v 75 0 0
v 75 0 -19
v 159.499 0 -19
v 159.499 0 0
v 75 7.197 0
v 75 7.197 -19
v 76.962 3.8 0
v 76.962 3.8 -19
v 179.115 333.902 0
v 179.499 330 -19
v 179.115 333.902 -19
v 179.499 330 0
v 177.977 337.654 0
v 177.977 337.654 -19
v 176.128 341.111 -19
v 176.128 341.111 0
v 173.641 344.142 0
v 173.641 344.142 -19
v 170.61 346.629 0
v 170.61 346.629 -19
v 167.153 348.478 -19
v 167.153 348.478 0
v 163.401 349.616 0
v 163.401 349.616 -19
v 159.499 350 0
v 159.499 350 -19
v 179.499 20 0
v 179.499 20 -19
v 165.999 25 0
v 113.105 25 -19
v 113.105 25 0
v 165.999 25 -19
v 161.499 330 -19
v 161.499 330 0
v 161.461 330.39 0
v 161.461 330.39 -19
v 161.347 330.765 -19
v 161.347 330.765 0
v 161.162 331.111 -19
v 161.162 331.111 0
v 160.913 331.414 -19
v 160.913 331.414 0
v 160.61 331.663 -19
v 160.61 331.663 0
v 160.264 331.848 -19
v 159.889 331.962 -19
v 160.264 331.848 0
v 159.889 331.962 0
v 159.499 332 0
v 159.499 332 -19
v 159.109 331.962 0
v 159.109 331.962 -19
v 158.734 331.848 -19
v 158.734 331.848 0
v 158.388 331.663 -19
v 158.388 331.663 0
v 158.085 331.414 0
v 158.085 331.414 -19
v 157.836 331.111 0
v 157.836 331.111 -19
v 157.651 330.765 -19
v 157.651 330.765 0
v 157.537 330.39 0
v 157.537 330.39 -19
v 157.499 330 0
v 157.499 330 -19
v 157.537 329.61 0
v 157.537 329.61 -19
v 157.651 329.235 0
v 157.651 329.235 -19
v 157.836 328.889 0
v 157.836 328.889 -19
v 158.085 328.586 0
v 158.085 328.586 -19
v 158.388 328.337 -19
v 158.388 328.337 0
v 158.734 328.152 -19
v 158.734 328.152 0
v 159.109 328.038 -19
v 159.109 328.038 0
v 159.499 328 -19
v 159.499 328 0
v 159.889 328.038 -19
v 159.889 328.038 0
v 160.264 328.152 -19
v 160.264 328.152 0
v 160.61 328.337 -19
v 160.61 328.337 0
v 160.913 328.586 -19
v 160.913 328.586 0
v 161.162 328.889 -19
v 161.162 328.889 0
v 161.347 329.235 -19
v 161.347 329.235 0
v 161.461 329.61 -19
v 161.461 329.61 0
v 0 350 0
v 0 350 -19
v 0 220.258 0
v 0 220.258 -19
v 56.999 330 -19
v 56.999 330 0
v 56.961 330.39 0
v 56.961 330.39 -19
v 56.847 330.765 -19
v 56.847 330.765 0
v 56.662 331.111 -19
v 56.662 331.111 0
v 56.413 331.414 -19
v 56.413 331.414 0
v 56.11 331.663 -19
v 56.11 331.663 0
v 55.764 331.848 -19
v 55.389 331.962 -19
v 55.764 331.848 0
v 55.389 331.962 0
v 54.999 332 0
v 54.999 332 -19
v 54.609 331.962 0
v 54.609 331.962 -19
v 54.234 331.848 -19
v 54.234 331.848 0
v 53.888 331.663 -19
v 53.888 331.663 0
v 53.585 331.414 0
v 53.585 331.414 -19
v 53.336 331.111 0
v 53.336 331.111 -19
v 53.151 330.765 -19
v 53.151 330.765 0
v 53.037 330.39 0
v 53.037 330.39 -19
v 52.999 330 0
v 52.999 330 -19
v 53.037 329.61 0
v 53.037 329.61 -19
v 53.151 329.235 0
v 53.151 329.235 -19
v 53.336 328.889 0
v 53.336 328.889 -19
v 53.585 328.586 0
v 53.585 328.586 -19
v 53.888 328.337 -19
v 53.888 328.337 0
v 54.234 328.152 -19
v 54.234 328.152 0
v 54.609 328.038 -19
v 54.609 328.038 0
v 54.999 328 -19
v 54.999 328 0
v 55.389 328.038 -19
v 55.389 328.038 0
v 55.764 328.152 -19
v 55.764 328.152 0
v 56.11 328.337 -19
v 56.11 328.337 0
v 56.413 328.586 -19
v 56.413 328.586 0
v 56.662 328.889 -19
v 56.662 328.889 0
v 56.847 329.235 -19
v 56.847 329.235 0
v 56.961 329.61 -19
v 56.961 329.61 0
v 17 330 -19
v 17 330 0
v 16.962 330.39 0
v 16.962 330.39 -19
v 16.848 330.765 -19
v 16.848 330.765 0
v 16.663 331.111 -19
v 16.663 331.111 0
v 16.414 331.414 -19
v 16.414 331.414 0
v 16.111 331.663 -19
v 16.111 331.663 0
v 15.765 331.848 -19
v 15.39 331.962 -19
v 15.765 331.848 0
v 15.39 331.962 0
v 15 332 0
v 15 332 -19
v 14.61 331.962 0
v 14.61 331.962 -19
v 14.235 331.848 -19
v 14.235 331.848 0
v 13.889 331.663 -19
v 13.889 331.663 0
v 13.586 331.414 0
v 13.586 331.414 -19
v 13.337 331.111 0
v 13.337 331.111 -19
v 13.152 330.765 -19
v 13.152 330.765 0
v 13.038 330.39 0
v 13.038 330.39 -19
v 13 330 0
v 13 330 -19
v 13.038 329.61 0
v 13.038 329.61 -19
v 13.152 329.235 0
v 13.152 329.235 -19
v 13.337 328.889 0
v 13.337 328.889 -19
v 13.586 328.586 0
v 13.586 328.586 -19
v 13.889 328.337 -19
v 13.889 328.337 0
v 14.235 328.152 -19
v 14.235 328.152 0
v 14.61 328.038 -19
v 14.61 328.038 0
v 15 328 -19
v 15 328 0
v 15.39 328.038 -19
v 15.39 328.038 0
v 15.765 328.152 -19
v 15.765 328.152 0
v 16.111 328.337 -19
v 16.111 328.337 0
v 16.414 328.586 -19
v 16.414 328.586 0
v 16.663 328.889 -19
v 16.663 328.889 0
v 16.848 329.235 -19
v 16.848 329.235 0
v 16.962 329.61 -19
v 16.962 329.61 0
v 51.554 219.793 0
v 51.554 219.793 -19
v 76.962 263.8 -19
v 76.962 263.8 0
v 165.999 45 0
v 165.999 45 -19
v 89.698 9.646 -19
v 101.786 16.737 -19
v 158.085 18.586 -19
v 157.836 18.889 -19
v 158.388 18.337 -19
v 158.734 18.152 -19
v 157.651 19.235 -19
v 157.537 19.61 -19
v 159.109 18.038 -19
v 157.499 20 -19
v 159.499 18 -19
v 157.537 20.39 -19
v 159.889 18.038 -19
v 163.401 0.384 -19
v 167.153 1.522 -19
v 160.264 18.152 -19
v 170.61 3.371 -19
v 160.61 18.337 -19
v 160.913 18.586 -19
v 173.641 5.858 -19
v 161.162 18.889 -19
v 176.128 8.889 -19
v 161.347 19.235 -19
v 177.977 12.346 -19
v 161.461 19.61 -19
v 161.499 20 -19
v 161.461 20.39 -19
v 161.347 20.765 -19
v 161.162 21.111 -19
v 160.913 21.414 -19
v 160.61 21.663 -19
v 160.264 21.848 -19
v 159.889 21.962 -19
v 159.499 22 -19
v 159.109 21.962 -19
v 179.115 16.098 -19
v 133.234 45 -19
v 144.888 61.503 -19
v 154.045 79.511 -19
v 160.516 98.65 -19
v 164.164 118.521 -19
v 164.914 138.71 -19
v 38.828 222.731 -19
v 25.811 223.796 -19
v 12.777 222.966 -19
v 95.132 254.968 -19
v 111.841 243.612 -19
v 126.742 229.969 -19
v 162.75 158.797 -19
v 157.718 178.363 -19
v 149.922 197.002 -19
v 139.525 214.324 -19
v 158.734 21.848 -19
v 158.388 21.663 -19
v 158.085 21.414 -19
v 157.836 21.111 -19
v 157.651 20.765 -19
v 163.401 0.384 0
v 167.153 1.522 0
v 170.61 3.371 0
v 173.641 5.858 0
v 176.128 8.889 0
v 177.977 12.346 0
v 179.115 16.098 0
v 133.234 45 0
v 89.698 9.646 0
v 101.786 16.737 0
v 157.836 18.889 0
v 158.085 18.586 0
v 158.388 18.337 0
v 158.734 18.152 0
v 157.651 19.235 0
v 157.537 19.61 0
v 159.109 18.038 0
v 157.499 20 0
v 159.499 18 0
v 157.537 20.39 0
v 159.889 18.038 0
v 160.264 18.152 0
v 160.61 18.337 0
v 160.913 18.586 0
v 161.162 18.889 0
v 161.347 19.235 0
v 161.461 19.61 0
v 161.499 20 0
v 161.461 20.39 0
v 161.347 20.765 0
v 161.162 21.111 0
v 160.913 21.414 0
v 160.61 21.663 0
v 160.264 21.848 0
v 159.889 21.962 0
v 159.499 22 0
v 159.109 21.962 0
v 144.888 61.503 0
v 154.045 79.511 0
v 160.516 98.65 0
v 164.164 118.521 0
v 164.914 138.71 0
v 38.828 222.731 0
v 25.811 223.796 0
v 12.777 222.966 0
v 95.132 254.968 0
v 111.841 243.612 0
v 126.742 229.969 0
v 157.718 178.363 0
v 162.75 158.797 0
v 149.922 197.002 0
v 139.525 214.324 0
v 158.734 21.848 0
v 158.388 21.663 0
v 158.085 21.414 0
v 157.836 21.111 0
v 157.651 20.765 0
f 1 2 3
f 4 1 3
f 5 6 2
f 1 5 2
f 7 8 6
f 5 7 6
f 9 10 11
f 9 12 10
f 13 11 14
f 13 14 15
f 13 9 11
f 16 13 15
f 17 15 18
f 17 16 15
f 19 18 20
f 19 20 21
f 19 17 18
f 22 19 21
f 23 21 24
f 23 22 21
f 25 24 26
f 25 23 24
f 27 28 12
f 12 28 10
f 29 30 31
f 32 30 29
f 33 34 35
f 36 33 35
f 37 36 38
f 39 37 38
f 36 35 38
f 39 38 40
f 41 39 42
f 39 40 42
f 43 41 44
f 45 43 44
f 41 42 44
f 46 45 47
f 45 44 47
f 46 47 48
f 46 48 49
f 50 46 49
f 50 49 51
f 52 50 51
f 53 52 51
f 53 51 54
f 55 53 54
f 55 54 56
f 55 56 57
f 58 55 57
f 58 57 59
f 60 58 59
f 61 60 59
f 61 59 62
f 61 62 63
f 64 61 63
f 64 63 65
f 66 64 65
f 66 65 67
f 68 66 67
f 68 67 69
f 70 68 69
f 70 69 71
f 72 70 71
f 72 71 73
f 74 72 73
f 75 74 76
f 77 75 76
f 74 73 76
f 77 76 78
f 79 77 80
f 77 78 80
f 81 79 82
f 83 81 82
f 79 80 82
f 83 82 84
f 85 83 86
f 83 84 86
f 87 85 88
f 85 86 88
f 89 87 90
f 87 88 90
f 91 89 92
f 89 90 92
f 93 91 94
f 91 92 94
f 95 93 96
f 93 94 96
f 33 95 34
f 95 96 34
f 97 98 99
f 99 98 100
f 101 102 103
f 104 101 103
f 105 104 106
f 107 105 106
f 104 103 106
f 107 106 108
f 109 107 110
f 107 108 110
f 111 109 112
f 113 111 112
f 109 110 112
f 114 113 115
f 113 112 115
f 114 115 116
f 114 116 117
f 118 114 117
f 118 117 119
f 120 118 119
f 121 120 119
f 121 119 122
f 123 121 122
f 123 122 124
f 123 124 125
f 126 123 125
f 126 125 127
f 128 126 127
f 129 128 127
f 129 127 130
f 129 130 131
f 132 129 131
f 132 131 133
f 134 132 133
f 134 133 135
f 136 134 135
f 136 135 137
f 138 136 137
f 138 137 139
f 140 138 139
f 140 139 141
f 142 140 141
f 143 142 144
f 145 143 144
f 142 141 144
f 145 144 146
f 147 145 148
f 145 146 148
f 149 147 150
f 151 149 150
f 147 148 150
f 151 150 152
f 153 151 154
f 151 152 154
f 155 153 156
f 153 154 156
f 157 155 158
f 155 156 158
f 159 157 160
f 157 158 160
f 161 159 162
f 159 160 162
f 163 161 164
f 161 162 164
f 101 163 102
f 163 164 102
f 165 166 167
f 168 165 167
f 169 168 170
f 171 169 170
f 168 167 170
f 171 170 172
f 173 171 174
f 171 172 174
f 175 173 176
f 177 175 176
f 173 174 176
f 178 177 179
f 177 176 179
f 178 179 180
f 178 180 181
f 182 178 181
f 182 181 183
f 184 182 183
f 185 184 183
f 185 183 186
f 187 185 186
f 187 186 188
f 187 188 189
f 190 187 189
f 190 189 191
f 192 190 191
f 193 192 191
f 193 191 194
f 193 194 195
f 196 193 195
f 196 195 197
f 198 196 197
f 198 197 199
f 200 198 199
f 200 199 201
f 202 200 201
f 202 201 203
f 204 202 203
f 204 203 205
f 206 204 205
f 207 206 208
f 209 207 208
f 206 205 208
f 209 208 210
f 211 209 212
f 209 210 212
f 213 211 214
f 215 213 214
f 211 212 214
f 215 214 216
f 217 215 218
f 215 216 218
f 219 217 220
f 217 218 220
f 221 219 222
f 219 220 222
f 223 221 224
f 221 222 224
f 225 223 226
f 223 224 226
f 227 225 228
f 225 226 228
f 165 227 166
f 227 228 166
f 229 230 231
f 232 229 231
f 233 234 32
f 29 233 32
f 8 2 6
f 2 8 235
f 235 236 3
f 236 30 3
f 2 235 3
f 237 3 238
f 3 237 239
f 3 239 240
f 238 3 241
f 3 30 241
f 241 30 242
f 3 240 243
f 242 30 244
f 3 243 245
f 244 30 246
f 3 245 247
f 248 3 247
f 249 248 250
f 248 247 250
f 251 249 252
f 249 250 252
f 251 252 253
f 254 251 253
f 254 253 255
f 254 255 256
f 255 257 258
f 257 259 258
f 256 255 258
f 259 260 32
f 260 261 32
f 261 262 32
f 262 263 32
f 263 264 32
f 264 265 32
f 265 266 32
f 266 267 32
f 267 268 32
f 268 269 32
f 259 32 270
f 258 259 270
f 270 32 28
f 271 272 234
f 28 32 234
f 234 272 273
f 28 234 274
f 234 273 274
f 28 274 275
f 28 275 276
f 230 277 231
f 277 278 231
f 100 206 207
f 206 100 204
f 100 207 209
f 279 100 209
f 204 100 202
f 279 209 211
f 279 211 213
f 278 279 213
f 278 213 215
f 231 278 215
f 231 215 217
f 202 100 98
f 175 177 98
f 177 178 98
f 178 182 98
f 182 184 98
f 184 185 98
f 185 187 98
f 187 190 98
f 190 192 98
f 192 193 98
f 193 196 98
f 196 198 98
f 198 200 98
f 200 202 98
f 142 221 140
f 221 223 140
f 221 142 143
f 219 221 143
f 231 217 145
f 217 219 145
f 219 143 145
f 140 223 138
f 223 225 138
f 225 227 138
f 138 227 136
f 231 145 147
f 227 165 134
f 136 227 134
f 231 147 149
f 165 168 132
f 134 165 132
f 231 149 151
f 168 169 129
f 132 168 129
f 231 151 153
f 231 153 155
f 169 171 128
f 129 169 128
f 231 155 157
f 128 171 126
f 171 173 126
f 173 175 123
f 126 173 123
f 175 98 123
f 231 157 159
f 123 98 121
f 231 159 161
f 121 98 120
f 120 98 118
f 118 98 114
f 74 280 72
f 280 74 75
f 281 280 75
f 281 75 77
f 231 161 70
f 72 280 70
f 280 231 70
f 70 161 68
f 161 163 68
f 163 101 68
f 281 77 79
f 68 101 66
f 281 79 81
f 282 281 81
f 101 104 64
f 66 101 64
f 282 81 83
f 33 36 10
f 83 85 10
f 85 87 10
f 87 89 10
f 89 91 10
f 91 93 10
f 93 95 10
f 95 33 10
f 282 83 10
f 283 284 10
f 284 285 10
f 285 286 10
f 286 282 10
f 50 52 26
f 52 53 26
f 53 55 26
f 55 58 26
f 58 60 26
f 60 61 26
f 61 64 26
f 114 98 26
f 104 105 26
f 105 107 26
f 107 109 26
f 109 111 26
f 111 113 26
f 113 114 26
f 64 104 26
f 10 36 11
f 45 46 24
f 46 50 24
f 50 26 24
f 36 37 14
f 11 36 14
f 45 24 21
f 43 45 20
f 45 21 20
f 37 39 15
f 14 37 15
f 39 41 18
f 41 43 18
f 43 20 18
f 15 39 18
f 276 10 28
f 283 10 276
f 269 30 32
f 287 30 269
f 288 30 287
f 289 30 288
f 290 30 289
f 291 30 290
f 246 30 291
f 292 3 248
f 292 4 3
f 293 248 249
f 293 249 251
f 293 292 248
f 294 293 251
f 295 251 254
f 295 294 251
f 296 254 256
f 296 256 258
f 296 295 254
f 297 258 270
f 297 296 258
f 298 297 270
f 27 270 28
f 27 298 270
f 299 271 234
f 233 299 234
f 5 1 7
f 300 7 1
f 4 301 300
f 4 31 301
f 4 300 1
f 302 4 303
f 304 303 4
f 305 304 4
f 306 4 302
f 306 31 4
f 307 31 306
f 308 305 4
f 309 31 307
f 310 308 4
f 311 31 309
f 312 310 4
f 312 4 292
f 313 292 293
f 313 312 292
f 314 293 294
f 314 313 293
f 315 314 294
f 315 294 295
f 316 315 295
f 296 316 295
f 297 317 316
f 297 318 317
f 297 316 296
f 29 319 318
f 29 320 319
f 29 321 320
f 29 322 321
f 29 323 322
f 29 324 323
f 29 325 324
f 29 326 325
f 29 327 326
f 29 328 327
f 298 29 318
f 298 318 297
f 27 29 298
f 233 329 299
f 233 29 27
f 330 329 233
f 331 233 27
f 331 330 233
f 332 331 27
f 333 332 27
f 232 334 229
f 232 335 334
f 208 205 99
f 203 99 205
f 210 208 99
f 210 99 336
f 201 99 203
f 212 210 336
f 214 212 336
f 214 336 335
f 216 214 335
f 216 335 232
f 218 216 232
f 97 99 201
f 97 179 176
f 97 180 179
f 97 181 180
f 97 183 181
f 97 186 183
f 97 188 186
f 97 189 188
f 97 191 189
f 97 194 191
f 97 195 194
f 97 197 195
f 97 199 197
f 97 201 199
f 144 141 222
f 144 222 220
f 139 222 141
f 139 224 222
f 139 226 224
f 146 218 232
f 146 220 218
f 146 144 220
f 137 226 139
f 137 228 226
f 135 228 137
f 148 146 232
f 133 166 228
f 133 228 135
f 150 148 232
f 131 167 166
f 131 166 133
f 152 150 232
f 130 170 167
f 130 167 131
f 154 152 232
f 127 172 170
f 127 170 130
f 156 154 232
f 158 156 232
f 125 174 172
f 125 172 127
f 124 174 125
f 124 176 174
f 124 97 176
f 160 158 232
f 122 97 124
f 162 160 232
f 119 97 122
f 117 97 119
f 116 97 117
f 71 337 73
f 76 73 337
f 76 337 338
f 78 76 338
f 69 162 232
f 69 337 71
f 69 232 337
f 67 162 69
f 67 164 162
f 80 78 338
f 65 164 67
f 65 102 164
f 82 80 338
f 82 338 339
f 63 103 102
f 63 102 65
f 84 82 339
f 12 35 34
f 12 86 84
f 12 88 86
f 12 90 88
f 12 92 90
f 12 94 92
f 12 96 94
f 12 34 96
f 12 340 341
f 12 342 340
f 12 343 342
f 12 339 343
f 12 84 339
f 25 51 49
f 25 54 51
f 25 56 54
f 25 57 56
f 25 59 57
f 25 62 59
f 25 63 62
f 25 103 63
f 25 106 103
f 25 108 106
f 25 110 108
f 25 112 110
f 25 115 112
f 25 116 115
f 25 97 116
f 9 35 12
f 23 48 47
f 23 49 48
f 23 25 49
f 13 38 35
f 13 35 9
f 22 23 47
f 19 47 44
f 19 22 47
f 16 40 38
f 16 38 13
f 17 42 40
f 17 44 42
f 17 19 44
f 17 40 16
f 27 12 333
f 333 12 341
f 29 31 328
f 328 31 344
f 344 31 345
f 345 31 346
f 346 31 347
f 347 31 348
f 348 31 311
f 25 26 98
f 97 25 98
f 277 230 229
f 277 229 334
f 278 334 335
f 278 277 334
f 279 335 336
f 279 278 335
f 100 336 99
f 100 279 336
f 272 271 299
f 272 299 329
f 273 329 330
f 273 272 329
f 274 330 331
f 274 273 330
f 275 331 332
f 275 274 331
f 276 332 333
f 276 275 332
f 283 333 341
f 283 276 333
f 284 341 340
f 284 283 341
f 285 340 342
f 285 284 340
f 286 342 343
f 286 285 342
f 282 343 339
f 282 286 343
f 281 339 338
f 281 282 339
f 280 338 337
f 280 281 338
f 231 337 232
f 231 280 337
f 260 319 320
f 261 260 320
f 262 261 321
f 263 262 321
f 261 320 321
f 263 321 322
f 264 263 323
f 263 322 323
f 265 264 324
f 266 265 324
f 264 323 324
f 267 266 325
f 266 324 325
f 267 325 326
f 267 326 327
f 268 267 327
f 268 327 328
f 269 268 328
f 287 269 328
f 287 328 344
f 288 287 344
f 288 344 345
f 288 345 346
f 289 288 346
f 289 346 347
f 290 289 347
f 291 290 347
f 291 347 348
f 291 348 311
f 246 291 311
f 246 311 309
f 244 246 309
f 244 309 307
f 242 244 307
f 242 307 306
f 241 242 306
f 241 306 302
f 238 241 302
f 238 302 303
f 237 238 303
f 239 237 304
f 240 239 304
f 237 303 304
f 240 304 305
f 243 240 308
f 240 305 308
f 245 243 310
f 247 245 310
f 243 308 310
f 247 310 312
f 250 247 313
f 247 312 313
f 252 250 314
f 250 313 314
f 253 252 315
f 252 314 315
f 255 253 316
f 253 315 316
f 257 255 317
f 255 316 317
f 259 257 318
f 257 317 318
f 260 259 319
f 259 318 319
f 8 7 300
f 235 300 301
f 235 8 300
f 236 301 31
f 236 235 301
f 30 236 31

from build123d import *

# Parameters (mm, degrees)
PAD016_DEPTH    = 19
FILLET006_R     = 20
SKETCH023_R     = 2
POCKET014_DEPTH = 19.001
SKETCH026_R     = 2
POCKET016_DEPTH = 19.001
SKETCH047_W     = 56
SKETCH047_H     = 20
POCKET030_DEPTH = 19.001


with BuildPart() as part:
    # Sketch021 → Pad016 (new body)
    with BuildSketch(Plane.XY):
        with BuildLine():
            Line((200, 216.2), (200, 86.458082))
            ThreePointArc((251.554314, 85.993421), (225.811141, 89.996345), (200, 86.458082))
            Line((251.554314, 85.993421), (276.961524, 130))
            ThreePointArc((276.961524, -130), (365, 0), (276.961524, 130))
            Line((276.961524, -130), (275, -126.60254))
            Line((275, -126.60254), (275, -133.8))
            Line((275, -133.8), (379.498932, -133.8))
            Line((379.498932, -133.8), (379.498932, 216.2))
            Line((379.498932, 216.2), (200, 216.2))
        make_face()
    extrude(amount=PAD016_DEPTH)

    # Fillet006
    fillet006_edges = [part.edges().sort_by_distance(p)[0] for p in [
        (379.498932, 216.2, 9.5),
        (379.498932, -133.8, 9.5),
    ]]
    fillet(fillet006_edges, radius=FILLET006_R)

    # Sketch023 (on Face5 of Fillet006) → Pocket014 (cut, through all)
    with BuildSketch(Plane.XY.offset(19)):
        with Locations((215, 196.2)):
            Circle(SKETCH023_R)
    extrude(amount=-POCKET014_DEPTH, mode=Mode.SUBTRACT)

    # Sketch026 (on Face5 of Pocket014) → Pocket016 (cut, through all)
    with BuildSketch(Plane.XY.offset(19)):
        with Locations((254.998932, 196.2)):
            Circle(SKETCH026_R)
        with Locations((359.498932, 196.2)):
            Circle(SKETCH026_R)
        with Locations((359.498932, -113.8)):
            Circle(SKETCH026_R)
    extrude(amount=-POCKET016_DEPTH, mode=Mode.SUBTRACT)

    # Sketch047 (on Face2 of Pocket016) → Pocket030 (cut, through all)
    with BuildSketch(Plane(origin=(0, 0, 0), x_dir=(1, 0, 0), z_dir=(0, 0, -1))):
        with Locations((337.998932, 98.8)):
            Rectangle(SKETCH047_W, SKETCH047_H)
    extrude(amount=-POCKET030_DEPTH, mode=Mode.SUBTRACT)


with BuildPart() as part_1:
    # Body012 placement: moved
    add(part.part.moved(Location((0, 0, -9))))


with BuildPart() as part_2:
    # Clone placement: moved
    add(part_1.part.moved(Location((-200, 133.8, -10))))


solid = part_2.part
